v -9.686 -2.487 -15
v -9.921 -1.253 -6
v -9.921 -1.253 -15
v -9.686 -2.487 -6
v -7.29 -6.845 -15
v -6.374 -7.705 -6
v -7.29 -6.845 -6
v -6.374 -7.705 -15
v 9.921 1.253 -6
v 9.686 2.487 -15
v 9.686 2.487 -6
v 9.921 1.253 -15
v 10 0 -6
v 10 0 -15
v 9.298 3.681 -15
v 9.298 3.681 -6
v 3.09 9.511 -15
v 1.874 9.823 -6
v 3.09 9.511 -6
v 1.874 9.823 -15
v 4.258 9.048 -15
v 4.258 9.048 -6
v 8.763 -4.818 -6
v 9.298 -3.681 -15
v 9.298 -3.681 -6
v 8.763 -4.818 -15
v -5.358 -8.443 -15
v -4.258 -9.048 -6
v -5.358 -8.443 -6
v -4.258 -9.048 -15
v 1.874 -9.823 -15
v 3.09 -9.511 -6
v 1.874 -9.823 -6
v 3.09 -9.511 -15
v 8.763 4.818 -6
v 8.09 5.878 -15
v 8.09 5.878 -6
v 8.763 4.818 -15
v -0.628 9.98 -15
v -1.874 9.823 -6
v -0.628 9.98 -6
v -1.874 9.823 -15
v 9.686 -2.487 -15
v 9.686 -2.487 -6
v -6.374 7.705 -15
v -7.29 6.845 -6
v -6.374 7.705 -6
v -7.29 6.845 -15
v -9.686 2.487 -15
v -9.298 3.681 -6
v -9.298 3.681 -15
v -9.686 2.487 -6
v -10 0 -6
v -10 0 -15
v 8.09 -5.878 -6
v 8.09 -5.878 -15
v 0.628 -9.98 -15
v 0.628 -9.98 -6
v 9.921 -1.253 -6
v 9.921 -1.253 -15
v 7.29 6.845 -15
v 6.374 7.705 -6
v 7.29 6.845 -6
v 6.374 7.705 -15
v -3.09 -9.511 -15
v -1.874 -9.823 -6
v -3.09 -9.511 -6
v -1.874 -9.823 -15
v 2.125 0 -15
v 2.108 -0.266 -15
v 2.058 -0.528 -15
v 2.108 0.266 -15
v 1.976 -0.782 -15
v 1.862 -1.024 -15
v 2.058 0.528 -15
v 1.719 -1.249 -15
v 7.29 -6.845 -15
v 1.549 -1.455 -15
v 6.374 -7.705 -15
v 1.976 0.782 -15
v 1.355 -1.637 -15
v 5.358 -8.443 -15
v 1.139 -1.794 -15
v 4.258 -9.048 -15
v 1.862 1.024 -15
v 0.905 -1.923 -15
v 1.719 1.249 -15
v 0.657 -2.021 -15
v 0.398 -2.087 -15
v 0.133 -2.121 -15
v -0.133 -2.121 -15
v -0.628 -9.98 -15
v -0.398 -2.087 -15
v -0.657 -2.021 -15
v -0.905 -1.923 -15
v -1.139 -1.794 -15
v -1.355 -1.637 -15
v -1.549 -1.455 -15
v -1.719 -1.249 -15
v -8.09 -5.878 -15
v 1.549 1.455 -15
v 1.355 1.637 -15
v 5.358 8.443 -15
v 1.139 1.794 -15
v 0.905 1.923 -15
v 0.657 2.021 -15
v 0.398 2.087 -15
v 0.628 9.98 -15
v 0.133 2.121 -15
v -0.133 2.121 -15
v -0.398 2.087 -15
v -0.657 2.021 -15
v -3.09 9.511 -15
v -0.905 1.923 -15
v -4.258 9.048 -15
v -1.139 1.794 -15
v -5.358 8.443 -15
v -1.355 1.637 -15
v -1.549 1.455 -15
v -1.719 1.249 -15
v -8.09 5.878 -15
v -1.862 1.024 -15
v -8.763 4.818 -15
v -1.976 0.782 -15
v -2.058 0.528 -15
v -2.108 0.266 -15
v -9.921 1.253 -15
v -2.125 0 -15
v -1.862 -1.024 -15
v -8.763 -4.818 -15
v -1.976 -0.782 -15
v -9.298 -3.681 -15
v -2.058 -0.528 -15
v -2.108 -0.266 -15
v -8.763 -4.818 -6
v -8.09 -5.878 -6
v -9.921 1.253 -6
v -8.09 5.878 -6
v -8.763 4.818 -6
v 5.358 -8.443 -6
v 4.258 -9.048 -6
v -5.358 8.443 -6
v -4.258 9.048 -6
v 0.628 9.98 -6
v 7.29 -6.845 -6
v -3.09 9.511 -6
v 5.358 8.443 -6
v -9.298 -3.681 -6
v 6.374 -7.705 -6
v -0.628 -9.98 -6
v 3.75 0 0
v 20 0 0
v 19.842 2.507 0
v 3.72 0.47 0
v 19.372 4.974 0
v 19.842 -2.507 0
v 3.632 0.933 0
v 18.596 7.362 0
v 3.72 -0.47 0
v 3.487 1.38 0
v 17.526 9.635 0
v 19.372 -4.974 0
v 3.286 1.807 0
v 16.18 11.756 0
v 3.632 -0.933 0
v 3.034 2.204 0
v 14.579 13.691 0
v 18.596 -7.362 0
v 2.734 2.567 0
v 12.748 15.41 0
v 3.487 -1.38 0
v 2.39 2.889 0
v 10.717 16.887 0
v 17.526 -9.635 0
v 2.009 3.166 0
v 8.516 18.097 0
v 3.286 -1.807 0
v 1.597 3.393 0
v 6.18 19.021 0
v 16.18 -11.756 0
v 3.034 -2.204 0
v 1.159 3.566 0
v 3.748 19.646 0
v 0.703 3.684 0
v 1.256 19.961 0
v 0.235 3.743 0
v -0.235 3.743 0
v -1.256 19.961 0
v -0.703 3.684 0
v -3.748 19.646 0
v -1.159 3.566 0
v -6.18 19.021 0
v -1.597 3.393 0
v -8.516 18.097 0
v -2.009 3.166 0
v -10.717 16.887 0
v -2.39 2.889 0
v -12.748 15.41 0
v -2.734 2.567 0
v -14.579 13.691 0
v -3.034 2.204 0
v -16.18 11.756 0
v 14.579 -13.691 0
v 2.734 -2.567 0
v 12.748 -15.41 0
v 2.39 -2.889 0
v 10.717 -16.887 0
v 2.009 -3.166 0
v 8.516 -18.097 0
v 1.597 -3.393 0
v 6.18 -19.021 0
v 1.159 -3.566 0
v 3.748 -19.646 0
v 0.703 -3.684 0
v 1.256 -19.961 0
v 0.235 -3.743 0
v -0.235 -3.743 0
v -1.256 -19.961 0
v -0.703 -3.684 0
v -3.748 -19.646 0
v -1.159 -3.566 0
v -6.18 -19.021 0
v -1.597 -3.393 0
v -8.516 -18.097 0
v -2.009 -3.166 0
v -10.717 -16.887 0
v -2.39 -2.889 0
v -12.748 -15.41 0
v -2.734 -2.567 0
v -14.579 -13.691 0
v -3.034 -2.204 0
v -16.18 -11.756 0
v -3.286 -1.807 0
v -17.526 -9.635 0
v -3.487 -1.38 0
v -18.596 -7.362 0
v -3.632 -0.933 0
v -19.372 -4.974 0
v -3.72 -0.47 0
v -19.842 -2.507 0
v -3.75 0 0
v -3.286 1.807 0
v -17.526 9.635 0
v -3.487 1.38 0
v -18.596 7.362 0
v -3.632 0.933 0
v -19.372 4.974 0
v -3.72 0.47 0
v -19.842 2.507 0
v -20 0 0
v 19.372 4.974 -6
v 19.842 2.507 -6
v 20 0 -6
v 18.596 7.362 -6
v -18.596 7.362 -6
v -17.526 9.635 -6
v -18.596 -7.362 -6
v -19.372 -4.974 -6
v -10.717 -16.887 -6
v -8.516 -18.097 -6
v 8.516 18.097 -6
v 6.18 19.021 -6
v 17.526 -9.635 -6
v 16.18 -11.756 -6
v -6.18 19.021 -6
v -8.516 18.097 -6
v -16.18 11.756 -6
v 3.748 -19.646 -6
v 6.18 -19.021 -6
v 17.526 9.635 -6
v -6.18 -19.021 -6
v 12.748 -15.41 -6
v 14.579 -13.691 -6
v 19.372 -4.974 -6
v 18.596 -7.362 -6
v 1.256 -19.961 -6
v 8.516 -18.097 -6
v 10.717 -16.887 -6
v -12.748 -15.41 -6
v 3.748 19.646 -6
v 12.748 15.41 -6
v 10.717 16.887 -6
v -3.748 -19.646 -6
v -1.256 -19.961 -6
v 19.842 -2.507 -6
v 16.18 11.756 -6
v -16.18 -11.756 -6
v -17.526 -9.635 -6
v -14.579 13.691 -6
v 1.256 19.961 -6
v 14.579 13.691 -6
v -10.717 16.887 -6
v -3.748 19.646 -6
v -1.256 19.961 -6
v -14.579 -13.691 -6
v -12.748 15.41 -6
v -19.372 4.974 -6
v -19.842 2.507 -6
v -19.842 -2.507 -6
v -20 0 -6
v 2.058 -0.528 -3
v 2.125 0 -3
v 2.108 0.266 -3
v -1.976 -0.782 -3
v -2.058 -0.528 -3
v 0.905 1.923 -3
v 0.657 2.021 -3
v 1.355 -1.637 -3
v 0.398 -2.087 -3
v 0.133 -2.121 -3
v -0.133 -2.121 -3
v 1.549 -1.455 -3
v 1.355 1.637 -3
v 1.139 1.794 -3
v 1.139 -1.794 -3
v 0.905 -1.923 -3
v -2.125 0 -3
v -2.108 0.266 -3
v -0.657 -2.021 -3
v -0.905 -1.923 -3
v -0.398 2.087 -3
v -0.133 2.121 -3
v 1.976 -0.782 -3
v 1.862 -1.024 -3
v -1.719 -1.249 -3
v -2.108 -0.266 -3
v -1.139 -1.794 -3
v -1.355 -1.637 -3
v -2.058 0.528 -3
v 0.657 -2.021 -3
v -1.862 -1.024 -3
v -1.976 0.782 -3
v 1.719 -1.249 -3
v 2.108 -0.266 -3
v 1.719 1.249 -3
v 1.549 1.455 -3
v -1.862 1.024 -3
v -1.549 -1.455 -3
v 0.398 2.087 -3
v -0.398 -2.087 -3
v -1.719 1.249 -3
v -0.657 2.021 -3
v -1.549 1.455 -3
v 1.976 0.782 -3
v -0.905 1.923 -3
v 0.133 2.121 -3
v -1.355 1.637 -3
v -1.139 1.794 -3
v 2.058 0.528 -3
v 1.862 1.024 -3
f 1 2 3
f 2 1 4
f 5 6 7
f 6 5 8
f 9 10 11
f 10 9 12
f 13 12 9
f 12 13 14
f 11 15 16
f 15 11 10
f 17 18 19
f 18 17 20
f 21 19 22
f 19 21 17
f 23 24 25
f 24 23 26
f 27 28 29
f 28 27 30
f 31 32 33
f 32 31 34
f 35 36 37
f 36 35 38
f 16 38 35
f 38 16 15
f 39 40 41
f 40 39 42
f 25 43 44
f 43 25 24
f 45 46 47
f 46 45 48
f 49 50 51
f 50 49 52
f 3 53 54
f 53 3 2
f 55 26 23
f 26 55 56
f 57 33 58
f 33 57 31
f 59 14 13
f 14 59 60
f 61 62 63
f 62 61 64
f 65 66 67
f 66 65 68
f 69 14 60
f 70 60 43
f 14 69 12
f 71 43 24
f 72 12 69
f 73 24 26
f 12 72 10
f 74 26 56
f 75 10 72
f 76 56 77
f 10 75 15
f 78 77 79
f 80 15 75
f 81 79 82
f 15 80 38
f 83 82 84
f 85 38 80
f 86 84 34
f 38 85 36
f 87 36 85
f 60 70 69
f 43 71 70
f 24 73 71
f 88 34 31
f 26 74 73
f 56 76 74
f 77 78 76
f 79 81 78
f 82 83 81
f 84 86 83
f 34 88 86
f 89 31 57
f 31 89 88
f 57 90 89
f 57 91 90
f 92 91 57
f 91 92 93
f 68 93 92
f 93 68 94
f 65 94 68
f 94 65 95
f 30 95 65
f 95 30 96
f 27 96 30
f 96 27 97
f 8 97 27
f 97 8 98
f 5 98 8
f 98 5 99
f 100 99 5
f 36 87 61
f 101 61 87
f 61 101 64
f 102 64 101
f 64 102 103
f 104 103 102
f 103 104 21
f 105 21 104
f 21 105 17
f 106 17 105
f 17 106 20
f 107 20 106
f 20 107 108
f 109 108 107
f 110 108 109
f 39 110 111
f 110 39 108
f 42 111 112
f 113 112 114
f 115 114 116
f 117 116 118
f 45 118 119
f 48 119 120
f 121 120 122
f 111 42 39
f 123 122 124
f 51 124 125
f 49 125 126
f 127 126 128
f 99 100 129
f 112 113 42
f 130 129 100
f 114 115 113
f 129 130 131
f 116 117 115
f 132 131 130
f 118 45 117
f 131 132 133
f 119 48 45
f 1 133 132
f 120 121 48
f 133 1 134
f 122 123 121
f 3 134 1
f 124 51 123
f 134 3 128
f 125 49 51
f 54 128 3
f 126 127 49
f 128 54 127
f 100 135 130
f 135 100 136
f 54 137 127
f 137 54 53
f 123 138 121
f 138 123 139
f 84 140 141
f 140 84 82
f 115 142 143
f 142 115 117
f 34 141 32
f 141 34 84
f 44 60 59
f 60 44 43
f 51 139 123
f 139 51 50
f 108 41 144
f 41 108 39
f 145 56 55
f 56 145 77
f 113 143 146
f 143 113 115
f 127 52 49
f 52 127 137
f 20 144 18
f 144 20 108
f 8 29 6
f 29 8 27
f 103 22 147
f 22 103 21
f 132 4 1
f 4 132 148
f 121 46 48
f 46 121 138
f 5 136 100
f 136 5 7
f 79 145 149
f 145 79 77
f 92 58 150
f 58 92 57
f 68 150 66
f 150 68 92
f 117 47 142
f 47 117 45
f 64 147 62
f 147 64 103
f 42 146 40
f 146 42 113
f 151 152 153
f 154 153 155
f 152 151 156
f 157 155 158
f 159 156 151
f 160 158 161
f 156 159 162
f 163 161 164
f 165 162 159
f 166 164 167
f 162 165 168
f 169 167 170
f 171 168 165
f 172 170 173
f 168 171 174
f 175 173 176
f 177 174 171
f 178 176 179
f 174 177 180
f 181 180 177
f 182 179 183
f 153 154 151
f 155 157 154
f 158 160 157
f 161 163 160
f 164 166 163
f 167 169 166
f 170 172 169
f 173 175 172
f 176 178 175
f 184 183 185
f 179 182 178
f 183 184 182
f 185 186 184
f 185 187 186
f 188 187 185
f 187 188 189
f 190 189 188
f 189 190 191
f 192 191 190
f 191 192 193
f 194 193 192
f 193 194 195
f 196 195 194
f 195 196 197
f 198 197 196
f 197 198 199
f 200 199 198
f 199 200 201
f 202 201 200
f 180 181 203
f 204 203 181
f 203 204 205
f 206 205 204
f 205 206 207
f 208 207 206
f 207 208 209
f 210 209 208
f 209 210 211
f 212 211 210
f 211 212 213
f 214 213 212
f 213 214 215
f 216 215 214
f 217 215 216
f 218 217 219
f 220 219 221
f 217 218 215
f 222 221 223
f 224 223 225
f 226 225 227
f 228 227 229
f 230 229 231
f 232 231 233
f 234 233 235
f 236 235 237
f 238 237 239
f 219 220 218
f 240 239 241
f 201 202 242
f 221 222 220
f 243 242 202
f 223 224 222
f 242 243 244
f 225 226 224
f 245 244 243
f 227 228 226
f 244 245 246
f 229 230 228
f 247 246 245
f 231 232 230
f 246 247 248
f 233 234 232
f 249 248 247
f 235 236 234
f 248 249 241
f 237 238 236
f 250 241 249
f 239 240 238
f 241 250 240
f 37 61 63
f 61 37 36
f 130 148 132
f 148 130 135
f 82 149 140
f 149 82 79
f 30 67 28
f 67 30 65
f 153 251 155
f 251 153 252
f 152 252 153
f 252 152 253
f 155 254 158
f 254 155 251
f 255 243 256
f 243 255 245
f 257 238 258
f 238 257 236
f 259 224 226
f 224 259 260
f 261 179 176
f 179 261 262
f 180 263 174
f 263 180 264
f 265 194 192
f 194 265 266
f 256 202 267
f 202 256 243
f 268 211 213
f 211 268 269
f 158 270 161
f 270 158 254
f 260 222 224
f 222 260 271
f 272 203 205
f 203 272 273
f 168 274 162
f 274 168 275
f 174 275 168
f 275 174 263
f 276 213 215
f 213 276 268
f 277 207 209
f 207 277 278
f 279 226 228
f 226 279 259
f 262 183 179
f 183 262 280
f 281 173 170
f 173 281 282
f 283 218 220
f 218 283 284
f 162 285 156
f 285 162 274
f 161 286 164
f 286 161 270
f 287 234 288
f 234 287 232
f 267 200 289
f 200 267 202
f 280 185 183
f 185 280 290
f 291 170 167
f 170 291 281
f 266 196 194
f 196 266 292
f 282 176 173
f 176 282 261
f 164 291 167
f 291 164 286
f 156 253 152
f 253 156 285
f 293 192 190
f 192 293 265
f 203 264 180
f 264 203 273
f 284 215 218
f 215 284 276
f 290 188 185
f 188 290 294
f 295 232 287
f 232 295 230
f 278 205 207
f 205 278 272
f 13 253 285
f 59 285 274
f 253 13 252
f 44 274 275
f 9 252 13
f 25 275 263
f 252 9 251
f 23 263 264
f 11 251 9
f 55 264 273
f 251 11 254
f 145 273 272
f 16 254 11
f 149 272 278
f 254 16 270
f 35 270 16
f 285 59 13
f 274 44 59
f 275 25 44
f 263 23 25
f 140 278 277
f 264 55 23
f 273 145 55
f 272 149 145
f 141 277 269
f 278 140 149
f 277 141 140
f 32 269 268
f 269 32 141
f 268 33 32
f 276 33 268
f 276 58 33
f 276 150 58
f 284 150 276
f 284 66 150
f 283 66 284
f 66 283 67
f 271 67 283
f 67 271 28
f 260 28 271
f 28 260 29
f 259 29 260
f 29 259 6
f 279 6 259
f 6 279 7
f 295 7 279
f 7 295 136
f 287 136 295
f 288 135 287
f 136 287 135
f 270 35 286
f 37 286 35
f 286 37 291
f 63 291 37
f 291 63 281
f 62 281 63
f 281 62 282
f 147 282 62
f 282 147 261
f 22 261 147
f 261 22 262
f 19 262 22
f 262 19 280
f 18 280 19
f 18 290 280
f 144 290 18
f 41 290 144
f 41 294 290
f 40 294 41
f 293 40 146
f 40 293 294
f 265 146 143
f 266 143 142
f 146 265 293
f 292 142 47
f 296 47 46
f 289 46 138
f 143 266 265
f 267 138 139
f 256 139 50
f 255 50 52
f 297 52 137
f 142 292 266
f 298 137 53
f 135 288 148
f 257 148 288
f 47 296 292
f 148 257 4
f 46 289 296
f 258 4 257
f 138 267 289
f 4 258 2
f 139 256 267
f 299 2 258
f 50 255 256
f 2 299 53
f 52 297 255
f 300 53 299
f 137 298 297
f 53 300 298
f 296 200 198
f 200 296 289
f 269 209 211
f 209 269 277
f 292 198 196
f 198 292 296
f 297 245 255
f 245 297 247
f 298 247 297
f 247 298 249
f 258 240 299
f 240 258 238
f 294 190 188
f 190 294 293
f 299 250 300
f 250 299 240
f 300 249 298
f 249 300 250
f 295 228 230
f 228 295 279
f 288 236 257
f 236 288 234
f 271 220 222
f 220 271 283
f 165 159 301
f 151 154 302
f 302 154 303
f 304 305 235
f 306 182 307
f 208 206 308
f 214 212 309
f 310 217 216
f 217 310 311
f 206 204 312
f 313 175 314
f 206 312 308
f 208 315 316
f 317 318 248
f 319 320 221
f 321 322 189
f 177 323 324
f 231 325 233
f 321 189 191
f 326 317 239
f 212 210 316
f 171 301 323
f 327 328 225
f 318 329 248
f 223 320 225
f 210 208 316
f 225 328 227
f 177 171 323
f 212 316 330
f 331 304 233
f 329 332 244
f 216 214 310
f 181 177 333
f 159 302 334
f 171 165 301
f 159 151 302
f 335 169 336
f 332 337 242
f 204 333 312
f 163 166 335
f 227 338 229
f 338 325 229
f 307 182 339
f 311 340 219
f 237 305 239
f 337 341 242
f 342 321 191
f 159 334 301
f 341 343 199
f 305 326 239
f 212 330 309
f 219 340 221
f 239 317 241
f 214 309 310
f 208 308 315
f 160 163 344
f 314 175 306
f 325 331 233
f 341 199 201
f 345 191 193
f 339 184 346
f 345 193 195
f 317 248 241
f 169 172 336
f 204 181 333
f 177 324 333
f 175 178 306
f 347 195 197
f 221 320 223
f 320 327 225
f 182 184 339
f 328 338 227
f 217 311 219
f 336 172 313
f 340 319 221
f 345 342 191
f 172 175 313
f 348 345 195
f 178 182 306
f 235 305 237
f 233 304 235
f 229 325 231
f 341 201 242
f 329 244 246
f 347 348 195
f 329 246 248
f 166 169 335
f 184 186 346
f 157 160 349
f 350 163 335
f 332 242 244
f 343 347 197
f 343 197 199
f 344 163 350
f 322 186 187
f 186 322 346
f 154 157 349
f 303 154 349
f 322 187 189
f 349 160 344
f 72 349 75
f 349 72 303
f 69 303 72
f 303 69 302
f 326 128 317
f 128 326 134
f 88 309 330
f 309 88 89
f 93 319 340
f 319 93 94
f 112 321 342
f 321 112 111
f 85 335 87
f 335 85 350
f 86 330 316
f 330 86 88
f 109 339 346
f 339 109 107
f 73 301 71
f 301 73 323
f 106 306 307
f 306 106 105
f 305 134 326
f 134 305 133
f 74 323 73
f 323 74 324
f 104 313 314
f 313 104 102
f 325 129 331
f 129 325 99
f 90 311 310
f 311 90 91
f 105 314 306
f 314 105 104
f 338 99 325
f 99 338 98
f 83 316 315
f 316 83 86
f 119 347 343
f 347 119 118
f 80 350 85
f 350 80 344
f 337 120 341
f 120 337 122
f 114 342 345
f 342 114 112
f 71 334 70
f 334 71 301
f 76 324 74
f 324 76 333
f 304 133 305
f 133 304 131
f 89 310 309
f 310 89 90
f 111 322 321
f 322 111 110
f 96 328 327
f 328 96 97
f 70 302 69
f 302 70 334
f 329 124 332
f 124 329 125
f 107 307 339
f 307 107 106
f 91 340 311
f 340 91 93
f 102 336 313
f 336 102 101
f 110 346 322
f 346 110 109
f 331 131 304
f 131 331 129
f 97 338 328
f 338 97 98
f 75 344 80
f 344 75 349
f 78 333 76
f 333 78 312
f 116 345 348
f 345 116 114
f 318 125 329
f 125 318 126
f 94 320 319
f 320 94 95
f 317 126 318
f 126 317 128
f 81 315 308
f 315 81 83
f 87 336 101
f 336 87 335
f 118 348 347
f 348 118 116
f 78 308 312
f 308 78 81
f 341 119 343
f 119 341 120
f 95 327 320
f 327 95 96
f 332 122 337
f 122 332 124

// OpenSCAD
$fn = 50;


difference() {
	union() {
		translate(v = [0, 0, -15.0000000000]) {
			cylinder(h = 15, r = 10.0000000000);
		}
		translate(v = [0, 0, -6.0000000000]) {
			cylinder(h = 6, r = 20.0000000000);
		}
	}
	union() {
		translate(v = [0, 0, 0]) {
			rotate(a = [0, 0, 0]) {
				difference() {
					union() {
						#translate(v = [0, 0, -15.0000000000]) {
							cylinder(h = 15, r = 2.0000000000);
						}
						#translate(v = [0, 0, -3]) {
							cylinder(h = 3, r = 10.0000000000, r1 = 2.1250000000, r2 = 3.7500000000);
						}
						#translate(v = [0, 0, -15.0000000000]) {
							cylinder(h = 15, r = 2.1250000000);
						}
						#translate(v = [0, 0, -15.0000000000]) {
							cylinder(h = 15, r = 2.0000000000);
						}
					}
					union();
				}
			}
		}
	}
}
